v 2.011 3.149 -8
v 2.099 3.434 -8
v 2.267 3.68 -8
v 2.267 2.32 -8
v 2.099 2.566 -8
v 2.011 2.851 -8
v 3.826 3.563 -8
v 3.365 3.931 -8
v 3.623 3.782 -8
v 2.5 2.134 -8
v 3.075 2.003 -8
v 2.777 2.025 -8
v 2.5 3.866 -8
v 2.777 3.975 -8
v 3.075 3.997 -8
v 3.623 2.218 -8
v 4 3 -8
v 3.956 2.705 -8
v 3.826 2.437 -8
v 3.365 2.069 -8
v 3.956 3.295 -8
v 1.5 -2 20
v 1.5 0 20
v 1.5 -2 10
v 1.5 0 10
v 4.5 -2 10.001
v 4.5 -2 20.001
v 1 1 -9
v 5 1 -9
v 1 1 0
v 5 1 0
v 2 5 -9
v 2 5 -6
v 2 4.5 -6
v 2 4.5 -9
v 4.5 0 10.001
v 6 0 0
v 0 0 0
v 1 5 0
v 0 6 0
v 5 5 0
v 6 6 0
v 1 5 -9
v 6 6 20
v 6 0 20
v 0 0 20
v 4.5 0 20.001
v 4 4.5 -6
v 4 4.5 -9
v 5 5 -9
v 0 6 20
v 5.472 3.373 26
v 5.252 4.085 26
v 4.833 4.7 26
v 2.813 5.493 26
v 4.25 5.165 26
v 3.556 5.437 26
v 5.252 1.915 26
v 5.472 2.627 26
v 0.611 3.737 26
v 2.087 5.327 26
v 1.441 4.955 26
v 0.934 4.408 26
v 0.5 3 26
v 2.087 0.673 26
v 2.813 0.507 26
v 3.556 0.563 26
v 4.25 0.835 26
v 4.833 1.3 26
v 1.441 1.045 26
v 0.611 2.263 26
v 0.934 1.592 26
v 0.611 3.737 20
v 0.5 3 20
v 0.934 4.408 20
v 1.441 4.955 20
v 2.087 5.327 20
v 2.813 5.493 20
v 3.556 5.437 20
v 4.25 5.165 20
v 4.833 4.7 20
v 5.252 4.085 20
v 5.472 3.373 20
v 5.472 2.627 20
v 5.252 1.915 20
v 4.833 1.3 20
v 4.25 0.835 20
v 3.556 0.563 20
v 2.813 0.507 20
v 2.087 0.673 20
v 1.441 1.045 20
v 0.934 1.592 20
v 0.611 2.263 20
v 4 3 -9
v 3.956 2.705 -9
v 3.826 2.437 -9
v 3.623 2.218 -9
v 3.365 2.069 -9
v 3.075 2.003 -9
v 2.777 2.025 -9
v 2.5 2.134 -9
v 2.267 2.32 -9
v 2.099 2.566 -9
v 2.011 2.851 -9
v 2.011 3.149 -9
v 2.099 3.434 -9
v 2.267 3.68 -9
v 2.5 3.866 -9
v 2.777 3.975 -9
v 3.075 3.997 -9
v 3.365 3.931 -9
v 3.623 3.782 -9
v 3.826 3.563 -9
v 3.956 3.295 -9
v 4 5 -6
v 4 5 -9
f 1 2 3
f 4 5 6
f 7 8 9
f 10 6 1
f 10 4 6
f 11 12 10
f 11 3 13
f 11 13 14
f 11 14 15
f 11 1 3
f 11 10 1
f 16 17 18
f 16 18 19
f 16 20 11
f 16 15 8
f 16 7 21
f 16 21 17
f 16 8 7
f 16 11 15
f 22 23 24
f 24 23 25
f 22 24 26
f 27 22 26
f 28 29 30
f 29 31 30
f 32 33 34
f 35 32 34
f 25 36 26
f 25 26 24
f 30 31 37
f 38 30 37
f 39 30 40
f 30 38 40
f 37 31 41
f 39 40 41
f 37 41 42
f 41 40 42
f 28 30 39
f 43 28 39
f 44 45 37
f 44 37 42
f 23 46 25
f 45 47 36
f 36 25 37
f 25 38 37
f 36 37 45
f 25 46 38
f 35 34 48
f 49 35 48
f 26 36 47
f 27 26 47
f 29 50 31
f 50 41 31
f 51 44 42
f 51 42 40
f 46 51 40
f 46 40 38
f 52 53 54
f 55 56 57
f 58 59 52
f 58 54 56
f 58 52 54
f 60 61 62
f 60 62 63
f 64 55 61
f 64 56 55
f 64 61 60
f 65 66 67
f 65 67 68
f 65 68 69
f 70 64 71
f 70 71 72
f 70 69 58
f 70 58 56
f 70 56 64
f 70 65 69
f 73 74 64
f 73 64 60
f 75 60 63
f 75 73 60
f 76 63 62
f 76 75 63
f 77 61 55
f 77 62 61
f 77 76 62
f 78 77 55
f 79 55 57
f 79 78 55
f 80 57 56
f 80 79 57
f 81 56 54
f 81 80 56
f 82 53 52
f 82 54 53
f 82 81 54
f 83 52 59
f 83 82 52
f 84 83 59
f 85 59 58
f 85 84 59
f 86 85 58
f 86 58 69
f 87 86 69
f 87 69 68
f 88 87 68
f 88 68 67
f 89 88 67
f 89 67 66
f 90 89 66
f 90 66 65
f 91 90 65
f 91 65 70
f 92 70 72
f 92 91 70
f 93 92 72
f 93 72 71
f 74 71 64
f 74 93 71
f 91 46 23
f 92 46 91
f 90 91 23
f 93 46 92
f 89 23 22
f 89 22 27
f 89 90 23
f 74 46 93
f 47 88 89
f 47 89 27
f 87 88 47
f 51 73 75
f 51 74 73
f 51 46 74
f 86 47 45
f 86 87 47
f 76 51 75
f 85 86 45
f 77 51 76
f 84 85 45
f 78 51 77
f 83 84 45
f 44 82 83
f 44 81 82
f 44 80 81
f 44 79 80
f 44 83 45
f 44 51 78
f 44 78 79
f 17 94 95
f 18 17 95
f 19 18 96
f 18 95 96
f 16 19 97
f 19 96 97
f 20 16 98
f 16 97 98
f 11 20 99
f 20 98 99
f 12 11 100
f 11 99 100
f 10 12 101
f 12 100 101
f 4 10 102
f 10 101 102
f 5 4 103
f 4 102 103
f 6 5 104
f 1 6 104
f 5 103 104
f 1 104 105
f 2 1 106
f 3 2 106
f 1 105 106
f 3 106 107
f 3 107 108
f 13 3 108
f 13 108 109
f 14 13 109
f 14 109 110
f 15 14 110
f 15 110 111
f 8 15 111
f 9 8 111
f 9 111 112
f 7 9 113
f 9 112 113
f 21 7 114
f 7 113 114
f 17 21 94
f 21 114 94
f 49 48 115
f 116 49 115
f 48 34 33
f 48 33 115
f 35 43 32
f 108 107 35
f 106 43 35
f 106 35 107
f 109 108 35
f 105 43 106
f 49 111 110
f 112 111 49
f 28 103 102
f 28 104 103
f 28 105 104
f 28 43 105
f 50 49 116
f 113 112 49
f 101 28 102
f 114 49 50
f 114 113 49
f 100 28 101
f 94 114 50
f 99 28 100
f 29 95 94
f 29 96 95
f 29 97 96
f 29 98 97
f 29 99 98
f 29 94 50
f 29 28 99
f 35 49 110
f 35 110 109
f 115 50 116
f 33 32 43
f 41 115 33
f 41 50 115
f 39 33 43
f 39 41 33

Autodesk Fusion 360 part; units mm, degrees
sketch "草图1" plane through (0, 0, 0) normal (0, 0, 1) x (1, 0, 0)
  line L0 (0, 0) -> (6, 0)
  line L1 (6, 0) -> (6, 6)
  line L2 (6, 6) -> (0, 6)
  line L3 (0, 6) -> (0, 0)
extrude "拉伸1" add sketch "草图1" along normal blind 20
sketch "草图2" plane through (0, 0, 0) normal (0, -1, 0) x (1, 0, 0)
  line L0 (0, 0) -> (6, 0)
  line L1 (6, 0) -> (6, 20)
  line L2 (6, 20) -> (0, 20)
  line L3 (0, 20) -> (0, 0)
  line L4 (0, 20) -> (1.5, 20)
  line L5 (1.5, 20) -> (1.5, 10)
  line L6 (1.5, 10) -> (0, 10)
  line L7 (0, 10) -> (0, 20)
  line L8 (0, 10) -> (0, 20)
  line L9 (0, 20) -> (1.5, 20)
  line L10 (1.5, 20) -> (1.5, 10)
  line L11 (0, 10) -> (0, 20)
  line L12 (1.5, 10) -> (0, 10)
  line L13 (0, 10) -> (0, 20)
  line L14 (0, 10) -> (0, 20)
  line L15 (1.5, 20) -> (1.5, 10)
  line L16 (0, 10) -> (0, 20)
  line L17 (0, 20) -> (1.5, 20)
  line L18 (1.5, 20) -> (1.5, 10)
  line L19 (1.5, 10) -> (0, 10)
  line L20 (0, 10) -> (0, 20)
  line L21 (1.5, 10) -> (0, 10)
  line L22 (0, 20) -> (1.5, 20)
  line L23 (0, 10) -> (0, 20)
  line L24 (4.4997, 10.0138) -> (4.4997, 20.0138)
  line L25 (5.9997, 20.0138) -> (5.9997, 10.0138)
  line L26 (4.4997, 10.0138) -> (4.4997, 20.0138)
  line L27 (4.4997, 20.0138) -> (5.9997, 20.0138)
  line L28 (5.9997, 20.0007) -> (5.9997, 10.0007)
  line L29 (5.9997, 10.0138) -> (4.4997, 10.0138)
  line L30 (4.4997, 10.0007) -> (4.4997, 20.0007)
  line L31 (5.9997, 10.0007) -> (4.4997, 10.0007)
  line L32 (4.4997, 20.0007) -> (5.9997, 20.0007)
  line L33 (4.4997, 10.0138) -> (4.4997, 20.0138)
  line L34 (1.5, 20) -> (4.4997, 20)
  line L35 (4.4997, 20) -> (4.4997, 10)
  line L36 (4.4997, 10) -> (1.5, 10)
  line L37 (1.5, 10) -> (1.5, 20)
  point P0 (0, 20)
  point P1 (0, 20)
  point P2 (0, 20)
  point P3 (4.4997, 20.0138)
  point P4 (4.4997, 20.0007)
  dimension "d3" = 10
  dimension "d4" = 10
  dimension "d5" = 10
  dimension "d6" = 10
  dimension "d7" = 10
  dimension "d8" = 10
  dimension "d9" = 10
  dimension "d10" = 10
  dimension "d11" = 10
  dimension "d12" = 10
  dimension "d13" = 10
  dimension "d14" = 10
  dimension "d15" = 10
extrude "拉伸2" add sketch "草图2" along normal blind 2 contours L2 L5 L10 L15 L18 L24 L26 L30 L33 L34 L35 L36 L37
sketch "草图3" plane through (0, 0, 20) normal (0, 0, 1) x (-1, 0, 0)
  line L0 (0, -6) -> (0, 0)
  line L1 (0, 0) -> (-1.5, 0)
  line L2 (-1.5, 0) -> (-1.5, 2)
  line L3 (-1.5, 2) -> (-4.4997, 2)
  line L4 (-4.4997, 2) -> (-4.4997, 0)
  line L5 (-4.4997, 0) -> (-6, 0)
  line L6 (-6, 0) -> (-6, -6)
  line L7 (-6, -6) -> (0, -6)
  circle A0 centre (-3, -3) radius 2.5
  dimension "d18" = 5
extrude "拉伸3" add sketch "草图3" along normal blind 6 contours A0
sketch "草图4" plane through (0, 0, 0) normal (0, 0, -1) x (1, 0, 0)
  line L0 (0, 0) -> (0, -6)
  line L1 (0, -6) -> (6, -6)
  line L2 (6, -6) -> (6, 0)
  line L3 (6, 0) -> (0, 0)
  line L4 (0, 0) -> (1, 0)
  line L5 (1, 0) -> (1, -6)
  line L6 (1, -6) -> (0, -6)
  line L7 (0, -6) -> (0, 0)
  line L8 (5, 0) -> (6, 0)
  line L9 (6, 0) -> (6, -6)
  line L10 (6, -6) -> (5, -6)
  line L11 (5, -6) -> (5, 0)
  line L12 (6, -5) -> (0, -5)
  line L13 (0, -5) -> (0, -6)
  line L14 (0, -6) -> (6, -6)
  line L15 (6, -6) -> (6, -5)
  line L16 (0, 0) -> (6, 0)
  line L17 (6, 0) -> (6, -1)
  line L18 (6, -1) -> (0, -1)
  line L19 (0, -1) -> (0, 0)
  line L20 (1, -1) -> (5, -1)
  line L21 (5, -1) -> (5, -5)
  line L22 (5, -5) -> (1, -5)
  line L23 (1, -5) -> (1, -1)
extrude "拉伸4" add sketch "草图4" along normal blind 6 contours L5 L11 L12 L18 L20 L21 L22 L23
sketch "草图5" plane through (0, 0, -6) normal (0, 0, -1) x (1, 0, 0)
  line L0 (5, -5) -> (5, -1)
  line L1 (5, -1) -> (1, -1)
  line L2 (1, -1) -> (1, -5)
  line L3 (1, -1) -> (5, -1)
  line L4 (5, -1) -> (5, -5)
  line L5 (1, -5) -> (1, -1)
  line L6 (1, -5) -> (2, -5)
  line L7 (2, -5) -> (2, -4.5)
  line L8 (2, -4.5) -> (4, -4.5)
  line L9 (4, -4.5) -> (4, -5)
  line L10 (4, -5) -> (5, -5)
  circle A0 centre (3, -3) radius 1
  dimension "d23" = 2
extrude "拉伸5" add sketch "草图5" along normal blind 3 contours L0 L1 L2 L3 L4 L5 L6 L7 L8 L9 L10 | A0
sketch "草图6" plane through (0, 0, -9) normal (0, 0, -1) x (1, 0, 0)
  line L0 (1, -5) -> (2, -5)
  line L1 (2, -5) -> (2, -4.5)
  line L2 (2, -4.5) -> (4, -4.5)
  line L3 (4, -4.5) -> (4, -5)
  line L4 (4, -5) -> (5, -5)
  line L5 (5, -5) -> (5, -1)
  line L6 (5, -1) -> (1, -1)
  line L7 (1, -1) -> (1, -5)
  circle A0 centre (3, -3) radius 1
  dimension "d26" = 2
extrude "拉伸6" cut sketch "草图6" against normal blind 1 contours A0
